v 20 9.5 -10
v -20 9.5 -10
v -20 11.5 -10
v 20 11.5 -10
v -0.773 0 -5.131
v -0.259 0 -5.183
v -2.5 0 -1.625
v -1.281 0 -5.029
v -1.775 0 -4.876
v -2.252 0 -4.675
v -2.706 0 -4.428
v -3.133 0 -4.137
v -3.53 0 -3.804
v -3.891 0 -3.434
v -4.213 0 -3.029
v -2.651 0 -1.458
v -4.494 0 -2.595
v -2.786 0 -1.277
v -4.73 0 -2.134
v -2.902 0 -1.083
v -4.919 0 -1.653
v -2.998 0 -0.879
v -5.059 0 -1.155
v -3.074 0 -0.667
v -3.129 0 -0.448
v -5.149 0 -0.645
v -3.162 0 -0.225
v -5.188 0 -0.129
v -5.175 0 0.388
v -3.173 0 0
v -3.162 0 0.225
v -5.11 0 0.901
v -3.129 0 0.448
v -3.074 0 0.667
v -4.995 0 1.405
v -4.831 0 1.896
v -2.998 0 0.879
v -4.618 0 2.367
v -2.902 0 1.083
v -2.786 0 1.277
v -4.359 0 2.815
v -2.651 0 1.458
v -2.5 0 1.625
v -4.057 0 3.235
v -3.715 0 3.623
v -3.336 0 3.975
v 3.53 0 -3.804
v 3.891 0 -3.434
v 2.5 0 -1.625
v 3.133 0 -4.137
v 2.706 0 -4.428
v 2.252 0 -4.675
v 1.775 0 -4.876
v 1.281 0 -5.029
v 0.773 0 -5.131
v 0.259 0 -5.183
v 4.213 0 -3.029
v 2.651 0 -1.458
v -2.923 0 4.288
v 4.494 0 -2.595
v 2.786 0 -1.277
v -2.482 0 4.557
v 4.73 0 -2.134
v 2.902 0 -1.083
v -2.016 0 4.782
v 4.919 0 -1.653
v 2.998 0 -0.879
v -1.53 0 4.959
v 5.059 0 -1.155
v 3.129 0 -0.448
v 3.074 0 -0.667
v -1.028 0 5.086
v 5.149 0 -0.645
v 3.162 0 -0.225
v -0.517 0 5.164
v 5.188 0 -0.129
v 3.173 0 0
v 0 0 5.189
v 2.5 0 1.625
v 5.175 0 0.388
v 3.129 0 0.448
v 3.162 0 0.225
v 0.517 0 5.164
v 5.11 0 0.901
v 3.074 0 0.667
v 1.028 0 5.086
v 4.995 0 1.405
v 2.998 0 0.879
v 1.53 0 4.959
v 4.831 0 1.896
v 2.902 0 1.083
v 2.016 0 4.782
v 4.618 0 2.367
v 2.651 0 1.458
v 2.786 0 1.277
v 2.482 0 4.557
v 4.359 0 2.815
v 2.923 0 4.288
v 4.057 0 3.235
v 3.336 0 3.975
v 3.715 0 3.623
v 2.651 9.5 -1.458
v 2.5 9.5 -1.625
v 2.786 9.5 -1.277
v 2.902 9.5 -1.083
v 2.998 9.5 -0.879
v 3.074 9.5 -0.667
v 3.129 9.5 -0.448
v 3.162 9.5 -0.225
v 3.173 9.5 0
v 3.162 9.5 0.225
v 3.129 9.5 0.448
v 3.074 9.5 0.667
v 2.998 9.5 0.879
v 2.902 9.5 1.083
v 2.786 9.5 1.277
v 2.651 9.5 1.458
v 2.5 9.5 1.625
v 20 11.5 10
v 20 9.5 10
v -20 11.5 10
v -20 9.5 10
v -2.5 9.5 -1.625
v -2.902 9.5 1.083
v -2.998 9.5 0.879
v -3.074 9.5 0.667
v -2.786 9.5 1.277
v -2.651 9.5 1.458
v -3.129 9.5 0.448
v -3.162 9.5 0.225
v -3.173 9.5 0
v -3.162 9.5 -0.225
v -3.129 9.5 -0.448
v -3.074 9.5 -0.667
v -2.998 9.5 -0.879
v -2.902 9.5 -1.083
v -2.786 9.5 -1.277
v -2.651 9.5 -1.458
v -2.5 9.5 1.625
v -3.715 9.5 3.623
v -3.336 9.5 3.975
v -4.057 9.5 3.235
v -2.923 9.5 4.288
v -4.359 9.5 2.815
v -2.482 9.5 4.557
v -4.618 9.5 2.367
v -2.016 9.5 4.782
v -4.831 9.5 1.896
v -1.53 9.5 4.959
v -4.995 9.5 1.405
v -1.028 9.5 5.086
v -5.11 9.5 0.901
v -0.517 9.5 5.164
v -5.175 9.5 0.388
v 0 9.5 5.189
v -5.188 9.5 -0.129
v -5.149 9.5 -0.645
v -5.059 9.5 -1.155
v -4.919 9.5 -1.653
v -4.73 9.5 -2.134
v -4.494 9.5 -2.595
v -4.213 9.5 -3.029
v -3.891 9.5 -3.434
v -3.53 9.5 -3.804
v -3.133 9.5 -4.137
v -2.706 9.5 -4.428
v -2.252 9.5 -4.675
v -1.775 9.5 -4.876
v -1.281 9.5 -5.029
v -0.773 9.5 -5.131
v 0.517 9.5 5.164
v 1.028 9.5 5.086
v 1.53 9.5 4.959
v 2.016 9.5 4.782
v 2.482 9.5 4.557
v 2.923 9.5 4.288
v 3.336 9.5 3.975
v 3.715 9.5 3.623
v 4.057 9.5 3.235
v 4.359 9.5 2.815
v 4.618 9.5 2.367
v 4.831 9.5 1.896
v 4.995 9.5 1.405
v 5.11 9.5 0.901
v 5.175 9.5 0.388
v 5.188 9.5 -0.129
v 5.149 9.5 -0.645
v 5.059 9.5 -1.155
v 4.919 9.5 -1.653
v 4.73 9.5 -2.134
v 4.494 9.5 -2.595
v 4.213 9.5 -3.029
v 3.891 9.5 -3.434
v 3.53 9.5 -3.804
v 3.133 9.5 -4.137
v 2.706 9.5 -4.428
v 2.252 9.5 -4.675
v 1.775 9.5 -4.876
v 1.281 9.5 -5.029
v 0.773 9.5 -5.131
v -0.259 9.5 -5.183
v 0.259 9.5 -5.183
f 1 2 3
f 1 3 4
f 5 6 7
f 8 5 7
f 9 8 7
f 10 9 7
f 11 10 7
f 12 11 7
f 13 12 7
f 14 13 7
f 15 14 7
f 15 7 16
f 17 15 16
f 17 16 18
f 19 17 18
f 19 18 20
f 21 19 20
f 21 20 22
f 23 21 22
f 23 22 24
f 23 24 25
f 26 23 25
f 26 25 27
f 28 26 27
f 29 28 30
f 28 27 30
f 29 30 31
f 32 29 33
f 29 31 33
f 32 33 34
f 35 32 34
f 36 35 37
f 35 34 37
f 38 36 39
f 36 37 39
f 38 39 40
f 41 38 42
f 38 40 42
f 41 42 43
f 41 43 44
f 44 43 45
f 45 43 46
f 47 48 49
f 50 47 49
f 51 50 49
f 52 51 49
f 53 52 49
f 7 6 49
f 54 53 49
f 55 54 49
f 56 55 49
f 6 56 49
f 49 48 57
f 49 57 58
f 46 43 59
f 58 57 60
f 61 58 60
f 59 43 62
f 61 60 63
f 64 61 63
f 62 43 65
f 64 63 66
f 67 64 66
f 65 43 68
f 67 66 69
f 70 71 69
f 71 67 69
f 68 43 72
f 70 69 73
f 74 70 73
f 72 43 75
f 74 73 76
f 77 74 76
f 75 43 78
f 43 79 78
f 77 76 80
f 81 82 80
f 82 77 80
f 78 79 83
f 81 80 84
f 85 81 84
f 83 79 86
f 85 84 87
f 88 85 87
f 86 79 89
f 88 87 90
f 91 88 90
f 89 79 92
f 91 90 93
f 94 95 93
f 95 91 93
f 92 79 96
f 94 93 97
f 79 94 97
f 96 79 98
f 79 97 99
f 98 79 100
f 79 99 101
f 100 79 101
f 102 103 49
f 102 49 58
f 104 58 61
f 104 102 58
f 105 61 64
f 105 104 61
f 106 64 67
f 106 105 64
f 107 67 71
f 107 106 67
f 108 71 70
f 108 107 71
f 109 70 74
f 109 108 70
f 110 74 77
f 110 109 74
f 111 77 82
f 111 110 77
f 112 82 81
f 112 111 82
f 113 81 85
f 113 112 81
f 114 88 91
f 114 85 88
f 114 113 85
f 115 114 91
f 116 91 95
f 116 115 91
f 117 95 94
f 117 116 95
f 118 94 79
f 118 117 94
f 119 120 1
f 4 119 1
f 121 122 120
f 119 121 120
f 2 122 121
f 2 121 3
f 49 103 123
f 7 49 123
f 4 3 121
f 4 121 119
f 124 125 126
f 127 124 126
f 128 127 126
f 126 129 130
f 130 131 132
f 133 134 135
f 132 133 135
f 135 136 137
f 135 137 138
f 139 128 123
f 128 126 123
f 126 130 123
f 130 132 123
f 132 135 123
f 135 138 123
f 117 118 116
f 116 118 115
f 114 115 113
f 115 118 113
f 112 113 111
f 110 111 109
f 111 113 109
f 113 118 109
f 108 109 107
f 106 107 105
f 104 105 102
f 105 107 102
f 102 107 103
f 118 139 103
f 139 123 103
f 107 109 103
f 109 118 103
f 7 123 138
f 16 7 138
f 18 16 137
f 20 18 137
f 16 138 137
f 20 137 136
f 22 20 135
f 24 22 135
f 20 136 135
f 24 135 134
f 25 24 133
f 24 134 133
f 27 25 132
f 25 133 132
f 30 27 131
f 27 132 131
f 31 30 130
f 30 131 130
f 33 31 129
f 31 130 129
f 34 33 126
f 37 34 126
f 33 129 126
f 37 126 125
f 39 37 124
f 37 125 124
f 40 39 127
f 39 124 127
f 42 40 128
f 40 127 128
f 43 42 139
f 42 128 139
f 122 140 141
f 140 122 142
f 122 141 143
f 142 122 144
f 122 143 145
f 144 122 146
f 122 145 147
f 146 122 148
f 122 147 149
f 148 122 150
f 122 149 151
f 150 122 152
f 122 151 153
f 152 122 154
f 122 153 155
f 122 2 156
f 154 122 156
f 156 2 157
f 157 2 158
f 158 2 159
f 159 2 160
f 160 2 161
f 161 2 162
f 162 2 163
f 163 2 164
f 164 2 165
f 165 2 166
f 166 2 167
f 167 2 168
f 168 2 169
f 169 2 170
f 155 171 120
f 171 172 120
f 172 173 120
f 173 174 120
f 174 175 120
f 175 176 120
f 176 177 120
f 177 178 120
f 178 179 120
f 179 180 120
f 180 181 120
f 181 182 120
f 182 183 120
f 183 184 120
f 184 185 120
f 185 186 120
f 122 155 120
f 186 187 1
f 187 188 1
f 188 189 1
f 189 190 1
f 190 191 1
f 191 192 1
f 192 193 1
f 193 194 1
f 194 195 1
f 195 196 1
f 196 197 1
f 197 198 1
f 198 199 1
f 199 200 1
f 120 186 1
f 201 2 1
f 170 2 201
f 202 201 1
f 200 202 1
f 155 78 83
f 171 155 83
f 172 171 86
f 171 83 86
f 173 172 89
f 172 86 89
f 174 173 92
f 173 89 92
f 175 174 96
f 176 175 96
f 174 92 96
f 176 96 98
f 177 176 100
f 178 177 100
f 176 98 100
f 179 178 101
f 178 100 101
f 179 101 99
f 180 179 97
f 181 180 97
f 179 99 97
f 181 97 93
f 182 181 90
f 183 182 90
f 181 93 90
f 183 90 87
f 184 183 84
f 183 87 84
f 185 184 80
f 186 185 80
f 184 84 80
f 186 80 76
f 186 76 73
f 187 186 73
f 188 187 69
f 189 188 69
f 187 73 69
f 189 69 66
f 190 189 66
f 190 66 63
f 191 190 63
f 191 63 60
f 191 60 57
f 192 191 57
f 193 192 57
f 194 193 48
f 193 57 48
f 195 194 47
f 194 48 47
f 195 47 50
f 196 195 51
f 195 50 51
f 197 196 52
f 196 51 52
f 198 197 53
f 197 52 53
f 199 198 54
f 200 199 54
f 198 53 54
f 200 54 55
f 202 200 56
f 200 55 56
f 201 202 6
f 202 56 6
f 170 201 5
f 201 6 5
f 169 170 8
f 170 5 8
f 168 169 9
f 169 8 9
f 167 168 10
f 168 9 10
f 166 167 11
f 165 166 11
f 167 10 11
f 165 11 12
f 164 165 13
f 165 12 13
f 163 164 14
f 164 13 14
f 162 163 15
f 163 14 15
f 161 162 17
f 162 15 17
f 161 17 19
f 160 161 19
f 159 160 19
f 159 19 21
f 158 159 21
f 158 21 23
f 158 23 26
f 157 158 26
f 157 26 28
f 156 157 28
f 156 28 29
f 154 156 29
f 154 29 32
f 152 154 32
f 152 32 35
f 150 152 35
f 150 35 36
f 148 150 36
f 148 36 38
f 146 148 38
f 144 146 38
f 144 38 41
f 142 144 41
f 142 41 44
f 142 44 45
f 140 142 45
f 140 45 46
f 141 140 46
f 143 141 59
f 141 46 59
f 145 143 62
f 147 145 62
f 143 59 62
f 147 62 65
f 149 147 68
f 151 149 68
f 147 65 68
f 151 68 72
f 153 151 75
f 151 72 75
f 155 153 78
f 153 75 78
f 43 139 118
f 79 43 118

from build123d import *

# Parameters (mm, degrees)
SKETCH2_R           = 5.189332
BOSS_EXTRUDE1_DEPTH = 9.5
CUT_EXTRUDE1_DEPTH  = 11.8
SKETCH5_W           = 40
SKETCH5_H           = 20
BOSS_EXTRUDE2_DEPTH = 2


with BuildPart() as part:
    # Sketch2 → Boss-Extrude1 (new body)
    with BuildSketch(Plane(origin=(0, 0, 0), x_dir=(1, 0, 0), z_dir=(0, 1, 0))):
        with Locations(Location((0, 0, 0), (0, 0, 270))):
            Circle(SKETCH2_R)
    extrude(amount=BOSS_EXTRUDE1_DEPTH)

    # Sketch4 → Cut-Extrude1 (cut)
    with BuildSketch(Plane(origin=(0, 9.5, 0), x_dir=(1, 0, 0), z_dir=(0, 1, 0))):
        with BuildLine():
            Line((0, 1.625), (-2.5, 1.625))
            ThreePointArc((-2.5, 1.625), (-3.173097039, 0), (-2.5, -1.625))
            Line((-2.5, -1.625), (0, -1.625))
            Line((0, -1.625), (0, 0))
            Line((0, 0), (0, 1.625))
        make_face()
        with BuildLine():
            ThreePointArc((2.5, 1.625), (3.173097039, 0), (2.5, -1.625))
            Line((2.5, -1.625), (0, -1.625))
            Line((0, -1.625), (0, 0))
            Line((0, 0), (0, 1.625))
            Line((0, 1.625), (2.5, 1.625))
        make_face()
    extrude(amount=-CUT_EXTRUDE1_DEPTH, mode=Mode.SUBTRACT)

    # Sketch5 → Boss-Extrude2 (add)
    with BuildSketch(Plane(origin=(0, 9.5, 0), x_dir=(1, 0, 0), z_dir=(0, 1, 0))):
        Rectangle(SKETCH5_W, SKETCH5_H)
    extrude(amount=BOSS_EXTRUDE2_DEPTH)


solid = part.part
